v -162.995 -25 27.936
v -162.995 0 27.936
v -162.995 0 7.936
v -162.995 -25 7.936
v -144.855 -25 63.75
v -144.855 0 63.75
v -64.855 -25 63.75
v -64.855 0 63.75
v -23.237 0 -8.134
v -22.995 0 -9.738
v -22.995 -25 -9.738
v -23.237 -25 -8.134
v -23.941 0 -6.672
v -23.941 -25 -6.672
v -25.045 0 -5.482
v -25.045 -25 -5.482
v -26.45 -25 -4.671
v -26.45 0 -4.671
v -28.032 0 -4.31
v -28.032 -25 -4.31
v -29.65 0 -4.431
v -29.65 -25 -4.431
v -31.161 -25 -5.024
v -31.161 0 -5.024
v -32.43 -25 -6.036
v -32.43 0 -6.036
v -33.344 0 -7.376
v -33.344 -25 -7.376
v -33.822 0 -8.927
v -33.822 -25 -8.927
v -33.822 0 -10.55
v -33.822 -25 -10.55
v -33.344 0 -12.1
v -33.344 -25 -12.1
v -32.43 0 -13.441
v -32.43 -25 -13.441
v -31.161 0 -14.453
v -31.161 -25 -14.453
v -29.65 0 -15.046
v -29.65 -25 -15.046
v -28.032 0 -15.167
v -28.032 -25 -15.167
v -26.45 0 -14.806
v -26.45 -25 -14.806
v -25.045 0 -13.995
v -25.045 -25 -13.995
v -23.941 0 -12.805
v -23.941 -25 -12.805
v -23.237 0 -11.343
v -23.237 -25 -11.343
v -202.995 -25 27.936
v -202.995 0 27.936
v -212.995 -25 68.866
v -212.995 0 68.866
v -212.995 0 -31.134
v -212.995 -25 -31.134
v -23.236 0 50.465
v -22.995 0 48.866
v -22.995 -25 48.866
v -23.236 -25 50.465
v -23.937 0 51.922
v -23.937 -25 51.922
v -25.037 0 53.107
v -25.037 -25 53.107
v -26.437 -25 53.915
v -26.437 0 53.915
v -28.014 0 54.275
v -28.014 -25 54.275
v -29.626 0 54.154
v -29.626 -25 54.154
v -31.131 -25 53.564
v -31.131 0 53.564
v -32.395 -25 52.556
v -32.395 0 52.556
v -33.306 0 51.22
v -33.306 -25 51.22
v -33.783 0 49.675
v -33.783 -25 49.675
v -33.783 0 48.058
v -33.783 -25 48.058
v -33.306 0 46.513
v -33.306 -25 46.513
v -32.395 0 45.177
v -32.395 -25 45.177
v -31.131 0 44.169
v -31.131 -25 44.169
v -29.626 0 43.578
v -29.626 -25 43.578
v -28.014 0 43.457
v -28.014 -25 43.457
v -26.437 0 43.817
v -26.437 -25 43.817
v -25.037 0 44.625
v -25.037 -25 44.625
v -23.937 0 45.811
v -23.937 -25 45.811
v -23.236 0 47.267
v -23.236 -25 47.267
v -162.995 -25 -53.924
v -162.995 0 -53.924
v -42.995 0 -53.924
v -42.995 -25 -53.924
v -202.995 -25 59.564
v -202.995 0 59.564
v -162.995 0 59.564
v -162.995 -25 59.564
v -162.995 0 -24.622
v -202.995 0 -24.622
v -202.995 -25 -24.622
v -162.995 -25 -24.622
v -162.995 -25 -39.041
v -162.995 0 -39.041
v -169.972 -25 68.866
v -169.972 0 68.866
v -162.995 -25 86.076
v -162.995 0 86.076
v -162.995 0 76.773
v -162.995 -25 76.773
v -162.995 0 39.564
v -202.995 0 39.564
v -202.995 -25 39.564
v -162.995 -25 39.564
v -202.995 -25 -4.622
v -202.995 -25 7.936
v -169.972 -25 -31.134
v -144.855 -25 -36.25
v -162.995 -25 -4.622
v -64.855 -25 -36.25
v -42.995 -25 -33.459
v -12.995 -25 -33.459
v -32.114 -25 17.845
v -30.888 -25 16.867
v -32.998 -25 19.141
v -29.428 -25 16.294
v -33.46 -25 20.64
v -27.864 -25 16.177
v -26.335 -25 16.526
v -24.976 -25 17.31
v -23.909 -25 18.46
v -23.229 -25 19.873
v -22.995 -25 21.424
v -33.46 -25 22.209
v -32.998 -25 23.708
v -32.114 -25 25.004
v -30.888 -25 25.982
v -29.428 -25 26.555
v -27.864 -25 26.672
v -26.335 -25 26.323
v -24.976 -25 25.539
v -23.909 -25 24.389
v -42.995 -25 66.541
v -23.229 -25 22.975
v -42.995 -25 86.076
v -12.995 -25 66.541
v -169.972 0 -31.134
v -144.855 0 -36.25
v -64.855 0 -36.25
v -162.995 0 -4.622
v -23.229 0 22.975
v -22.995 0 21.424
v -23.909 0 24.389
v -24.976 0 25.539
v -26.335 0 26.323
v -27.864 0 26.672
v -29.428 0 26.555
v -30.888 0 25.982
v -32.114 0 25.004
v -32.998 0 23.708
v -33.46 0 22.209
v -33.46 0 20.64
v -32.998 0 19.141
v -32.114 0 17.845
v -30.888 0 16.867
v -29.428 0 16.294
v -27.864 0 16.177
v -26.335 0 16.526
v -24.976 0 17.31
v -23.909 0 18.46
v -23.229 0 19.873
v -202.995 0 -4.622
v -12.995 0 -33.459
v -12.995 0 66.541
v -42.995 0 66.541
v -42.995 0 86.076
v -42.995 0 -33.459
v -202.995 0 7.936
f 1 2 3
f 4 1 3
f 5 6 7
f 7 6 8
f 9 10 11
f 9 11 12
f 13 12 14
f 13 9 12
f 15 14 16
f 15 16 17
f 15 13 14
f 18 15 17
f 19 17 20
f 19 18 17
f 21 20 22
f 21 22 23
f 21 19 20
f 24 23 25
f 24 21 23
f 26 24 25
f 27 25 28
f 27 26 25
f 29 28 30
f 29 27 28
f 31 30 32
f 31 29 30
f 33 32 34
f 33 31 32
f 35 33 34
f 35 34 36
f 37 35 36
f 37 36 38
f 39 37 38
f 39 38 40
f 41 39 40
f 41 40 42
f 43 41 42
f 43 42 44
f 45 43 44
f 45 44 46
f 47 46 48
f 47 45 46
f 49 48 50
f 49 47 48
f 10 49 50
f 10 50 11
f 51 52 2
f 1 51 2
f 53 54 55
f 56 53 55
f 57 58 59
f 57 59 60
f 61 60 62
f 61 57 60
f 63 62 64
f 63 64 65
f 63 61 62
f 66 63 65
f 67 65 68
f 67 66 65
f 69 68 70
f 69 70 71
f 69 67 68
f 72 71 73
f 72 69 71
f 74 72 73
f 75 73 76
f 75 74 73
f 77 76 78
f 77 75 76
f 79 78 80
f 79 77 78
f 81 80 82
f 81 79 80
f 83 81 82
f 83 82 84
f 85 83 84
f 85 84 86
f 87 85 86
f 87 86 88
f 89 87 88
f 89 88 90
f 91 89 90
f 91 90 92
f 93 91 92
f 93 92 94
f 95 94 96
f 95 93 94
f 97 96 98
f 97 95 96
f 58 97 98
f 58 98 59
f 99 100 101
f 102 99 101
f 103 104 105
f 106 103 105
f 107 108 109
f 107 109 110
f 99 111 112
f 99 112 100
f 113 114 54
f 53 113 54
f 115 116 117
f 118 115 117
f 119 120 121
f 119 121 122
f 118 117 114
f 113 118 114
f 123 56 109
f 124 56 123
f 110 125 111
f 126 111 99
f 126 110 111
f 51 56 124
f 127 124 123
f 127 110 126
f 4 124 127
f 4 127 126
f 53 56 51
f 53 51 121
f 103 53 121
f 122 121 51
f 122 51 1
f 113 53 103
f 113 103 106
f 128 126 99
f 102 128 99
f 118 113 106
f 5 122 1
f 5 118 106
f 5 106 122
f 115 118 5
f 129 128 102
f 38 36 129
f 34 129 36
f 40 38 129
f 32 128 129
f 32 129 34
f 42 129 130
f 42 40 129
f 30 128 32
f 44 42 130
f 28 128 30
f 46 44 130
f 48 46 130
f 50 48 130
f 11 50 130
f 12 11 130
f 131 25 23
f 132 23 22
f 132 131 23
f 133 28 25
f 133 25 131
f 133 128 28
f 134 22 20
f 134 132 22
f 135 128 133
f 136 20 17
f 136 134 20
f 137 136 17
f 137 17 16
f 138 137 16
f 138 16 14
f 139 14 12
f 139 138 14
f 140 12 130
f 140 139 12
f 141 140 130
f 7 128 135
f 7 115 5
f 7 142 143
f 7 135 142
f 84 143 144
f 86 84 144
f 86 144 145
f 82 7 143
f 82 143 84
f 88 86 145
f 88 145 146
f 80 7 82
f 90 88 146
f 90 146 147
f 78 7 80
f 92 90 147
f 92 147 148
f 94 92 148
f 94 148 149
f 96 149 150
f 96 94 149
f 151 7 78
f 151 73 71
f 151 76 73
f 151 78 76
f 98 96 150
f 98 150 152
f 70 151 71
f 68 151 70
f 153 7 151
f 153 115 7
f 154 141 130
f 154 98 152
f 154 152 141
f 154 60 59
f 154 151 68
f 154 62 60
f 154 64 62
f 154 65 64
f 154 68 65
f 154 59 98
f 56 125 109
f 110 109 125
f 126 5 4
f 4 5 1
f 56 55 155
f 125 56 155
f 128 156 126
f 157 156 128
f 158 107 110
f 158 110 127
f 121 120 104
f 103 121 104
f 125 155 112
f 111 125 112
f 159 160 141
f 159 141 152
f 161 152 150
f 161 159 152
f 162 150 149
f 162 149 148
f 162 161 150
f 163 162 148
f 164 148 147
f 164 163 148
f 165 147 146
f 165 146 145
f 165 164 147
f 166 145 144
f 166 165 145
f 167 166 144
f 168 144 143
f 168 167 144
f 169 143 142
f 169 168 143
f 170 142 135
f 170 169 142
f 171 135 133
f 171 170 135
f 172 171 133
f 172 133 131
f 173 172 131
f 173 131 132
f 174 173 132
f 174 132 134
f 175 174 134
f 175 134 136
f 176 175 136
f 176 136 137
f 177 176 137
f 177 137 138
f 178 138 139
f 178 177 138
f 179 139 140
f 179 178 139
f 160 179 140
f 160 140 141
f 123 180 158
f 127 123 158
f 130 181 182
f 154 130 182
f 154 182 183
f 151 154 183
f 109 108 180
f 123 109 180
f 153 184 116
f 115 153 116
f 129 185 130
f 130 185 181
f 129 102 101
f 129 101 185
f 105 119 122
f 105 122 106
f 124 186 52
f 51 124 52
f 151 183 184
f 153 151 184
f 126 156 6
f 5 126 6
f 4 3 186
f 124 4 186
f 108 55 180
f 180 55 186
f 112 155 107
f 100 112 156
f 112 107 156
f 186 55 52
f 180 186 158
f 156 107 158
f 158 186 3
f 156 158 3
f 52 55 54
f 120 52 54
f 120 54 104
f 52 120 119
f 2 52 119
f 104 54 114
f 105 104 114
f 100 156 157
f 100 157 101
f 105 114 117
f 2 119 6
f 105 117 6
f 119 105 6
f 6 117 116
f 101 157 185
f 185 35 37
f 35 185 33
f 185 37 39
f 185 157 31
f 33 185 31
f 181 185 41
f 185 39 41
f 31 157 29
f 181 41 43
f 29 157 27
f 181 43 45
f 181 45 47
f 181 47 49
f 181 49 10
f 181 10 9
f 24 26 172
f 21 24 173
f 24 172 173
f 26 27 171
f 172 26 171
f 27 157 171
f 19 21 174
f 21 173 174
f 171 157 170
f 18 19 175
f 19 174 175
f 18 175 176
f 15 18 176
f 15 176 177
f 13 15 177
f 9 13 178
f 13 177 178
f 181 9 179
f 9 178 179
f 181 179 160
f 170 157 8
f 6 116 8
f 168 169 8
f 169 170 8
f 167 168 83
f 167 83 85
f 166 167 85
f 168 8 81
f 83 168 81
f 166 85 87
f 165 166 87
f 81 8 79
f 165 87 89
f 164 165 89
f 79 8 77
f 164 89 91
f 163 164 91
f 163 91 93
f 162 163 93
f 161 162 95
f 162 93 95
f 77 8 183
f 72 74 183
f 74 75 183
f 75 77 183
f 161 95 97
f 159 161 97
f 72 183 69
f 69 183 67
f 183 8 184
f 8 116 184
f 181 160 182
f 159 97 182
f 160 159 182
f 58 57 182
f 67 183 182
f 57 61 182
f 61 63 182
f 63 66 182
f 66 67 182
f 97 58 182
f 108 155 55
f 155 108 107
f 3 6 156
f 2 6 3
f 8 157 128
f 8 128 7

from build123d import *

# Parameters (mm, degrees)
F0_W     = 40
F0_H     = 20
F0_W_2   = 80
F0_H_2   = 100
F0_R     = 5.444049
F0_H_3   = 20.000004
F0_R_2   = 5.262192
F0_R_3   = 5.424143
F1_DEPTH = 25


with BuildPart() as f1:
    # F0 (on Front) → F1 (new body)
    with BuildSketch(Plane.XZ):
        Polygon((-162.994809, -39.040719), (-162.994809, -53.924445), (-42.994809, -53.924445), (-42.994809, -33.45933), (-12.994809, -33.45933), (-12.994809, 66.540668), (-42.994809, 66.540668), (-42.994809, 86.075555), (-162.994809, 86.075555), (-162.994809, 76.773231), (-169.971554, 68.866255), (-212.994809, 68.866255), (-212.994809, -31.133745), (-169.971554, -31.133745), align=None)
        with Locations((-182.994809, -14.622118)):
            Rectangle(F0_W, F0_H, mode=Mode.SUBTRACT)
        with Locations((-104.85527, 13.749972)):
            Rectangle(F0_W_2, F0_H_2, mode=Mode.SUBTRACT)
        with Locations((-28.438857, -9.738397)):
            Circle(F0_R, mode=Mode.SUBTRACT)
        Polygon((-202.994809, 7.936021), (-202.994809, 27.936022), (-175.087825, 27.936022), (-162.994809, 27.936022), (-162.994809, 7.936021), (-175.087825, 7.936021), align=None, mode=Mode.SUBTRACT)
        with Locations((-182.994809, 49.563928)):
            Rectangle(F0_W, F0_H_3, mode=Mode.SUBTRACT)
        with Locations((-28.257, 21.424393)):
            Circle(F0_R_2, mode=Mode.SUBTRACT)
        with Locations((-28.418952, 48.866255)):
            Circle(F0_R_3, mode=Mode.SUBTRACT)
    extrude(amount=F1_DEPTH)


solid = f1.part
